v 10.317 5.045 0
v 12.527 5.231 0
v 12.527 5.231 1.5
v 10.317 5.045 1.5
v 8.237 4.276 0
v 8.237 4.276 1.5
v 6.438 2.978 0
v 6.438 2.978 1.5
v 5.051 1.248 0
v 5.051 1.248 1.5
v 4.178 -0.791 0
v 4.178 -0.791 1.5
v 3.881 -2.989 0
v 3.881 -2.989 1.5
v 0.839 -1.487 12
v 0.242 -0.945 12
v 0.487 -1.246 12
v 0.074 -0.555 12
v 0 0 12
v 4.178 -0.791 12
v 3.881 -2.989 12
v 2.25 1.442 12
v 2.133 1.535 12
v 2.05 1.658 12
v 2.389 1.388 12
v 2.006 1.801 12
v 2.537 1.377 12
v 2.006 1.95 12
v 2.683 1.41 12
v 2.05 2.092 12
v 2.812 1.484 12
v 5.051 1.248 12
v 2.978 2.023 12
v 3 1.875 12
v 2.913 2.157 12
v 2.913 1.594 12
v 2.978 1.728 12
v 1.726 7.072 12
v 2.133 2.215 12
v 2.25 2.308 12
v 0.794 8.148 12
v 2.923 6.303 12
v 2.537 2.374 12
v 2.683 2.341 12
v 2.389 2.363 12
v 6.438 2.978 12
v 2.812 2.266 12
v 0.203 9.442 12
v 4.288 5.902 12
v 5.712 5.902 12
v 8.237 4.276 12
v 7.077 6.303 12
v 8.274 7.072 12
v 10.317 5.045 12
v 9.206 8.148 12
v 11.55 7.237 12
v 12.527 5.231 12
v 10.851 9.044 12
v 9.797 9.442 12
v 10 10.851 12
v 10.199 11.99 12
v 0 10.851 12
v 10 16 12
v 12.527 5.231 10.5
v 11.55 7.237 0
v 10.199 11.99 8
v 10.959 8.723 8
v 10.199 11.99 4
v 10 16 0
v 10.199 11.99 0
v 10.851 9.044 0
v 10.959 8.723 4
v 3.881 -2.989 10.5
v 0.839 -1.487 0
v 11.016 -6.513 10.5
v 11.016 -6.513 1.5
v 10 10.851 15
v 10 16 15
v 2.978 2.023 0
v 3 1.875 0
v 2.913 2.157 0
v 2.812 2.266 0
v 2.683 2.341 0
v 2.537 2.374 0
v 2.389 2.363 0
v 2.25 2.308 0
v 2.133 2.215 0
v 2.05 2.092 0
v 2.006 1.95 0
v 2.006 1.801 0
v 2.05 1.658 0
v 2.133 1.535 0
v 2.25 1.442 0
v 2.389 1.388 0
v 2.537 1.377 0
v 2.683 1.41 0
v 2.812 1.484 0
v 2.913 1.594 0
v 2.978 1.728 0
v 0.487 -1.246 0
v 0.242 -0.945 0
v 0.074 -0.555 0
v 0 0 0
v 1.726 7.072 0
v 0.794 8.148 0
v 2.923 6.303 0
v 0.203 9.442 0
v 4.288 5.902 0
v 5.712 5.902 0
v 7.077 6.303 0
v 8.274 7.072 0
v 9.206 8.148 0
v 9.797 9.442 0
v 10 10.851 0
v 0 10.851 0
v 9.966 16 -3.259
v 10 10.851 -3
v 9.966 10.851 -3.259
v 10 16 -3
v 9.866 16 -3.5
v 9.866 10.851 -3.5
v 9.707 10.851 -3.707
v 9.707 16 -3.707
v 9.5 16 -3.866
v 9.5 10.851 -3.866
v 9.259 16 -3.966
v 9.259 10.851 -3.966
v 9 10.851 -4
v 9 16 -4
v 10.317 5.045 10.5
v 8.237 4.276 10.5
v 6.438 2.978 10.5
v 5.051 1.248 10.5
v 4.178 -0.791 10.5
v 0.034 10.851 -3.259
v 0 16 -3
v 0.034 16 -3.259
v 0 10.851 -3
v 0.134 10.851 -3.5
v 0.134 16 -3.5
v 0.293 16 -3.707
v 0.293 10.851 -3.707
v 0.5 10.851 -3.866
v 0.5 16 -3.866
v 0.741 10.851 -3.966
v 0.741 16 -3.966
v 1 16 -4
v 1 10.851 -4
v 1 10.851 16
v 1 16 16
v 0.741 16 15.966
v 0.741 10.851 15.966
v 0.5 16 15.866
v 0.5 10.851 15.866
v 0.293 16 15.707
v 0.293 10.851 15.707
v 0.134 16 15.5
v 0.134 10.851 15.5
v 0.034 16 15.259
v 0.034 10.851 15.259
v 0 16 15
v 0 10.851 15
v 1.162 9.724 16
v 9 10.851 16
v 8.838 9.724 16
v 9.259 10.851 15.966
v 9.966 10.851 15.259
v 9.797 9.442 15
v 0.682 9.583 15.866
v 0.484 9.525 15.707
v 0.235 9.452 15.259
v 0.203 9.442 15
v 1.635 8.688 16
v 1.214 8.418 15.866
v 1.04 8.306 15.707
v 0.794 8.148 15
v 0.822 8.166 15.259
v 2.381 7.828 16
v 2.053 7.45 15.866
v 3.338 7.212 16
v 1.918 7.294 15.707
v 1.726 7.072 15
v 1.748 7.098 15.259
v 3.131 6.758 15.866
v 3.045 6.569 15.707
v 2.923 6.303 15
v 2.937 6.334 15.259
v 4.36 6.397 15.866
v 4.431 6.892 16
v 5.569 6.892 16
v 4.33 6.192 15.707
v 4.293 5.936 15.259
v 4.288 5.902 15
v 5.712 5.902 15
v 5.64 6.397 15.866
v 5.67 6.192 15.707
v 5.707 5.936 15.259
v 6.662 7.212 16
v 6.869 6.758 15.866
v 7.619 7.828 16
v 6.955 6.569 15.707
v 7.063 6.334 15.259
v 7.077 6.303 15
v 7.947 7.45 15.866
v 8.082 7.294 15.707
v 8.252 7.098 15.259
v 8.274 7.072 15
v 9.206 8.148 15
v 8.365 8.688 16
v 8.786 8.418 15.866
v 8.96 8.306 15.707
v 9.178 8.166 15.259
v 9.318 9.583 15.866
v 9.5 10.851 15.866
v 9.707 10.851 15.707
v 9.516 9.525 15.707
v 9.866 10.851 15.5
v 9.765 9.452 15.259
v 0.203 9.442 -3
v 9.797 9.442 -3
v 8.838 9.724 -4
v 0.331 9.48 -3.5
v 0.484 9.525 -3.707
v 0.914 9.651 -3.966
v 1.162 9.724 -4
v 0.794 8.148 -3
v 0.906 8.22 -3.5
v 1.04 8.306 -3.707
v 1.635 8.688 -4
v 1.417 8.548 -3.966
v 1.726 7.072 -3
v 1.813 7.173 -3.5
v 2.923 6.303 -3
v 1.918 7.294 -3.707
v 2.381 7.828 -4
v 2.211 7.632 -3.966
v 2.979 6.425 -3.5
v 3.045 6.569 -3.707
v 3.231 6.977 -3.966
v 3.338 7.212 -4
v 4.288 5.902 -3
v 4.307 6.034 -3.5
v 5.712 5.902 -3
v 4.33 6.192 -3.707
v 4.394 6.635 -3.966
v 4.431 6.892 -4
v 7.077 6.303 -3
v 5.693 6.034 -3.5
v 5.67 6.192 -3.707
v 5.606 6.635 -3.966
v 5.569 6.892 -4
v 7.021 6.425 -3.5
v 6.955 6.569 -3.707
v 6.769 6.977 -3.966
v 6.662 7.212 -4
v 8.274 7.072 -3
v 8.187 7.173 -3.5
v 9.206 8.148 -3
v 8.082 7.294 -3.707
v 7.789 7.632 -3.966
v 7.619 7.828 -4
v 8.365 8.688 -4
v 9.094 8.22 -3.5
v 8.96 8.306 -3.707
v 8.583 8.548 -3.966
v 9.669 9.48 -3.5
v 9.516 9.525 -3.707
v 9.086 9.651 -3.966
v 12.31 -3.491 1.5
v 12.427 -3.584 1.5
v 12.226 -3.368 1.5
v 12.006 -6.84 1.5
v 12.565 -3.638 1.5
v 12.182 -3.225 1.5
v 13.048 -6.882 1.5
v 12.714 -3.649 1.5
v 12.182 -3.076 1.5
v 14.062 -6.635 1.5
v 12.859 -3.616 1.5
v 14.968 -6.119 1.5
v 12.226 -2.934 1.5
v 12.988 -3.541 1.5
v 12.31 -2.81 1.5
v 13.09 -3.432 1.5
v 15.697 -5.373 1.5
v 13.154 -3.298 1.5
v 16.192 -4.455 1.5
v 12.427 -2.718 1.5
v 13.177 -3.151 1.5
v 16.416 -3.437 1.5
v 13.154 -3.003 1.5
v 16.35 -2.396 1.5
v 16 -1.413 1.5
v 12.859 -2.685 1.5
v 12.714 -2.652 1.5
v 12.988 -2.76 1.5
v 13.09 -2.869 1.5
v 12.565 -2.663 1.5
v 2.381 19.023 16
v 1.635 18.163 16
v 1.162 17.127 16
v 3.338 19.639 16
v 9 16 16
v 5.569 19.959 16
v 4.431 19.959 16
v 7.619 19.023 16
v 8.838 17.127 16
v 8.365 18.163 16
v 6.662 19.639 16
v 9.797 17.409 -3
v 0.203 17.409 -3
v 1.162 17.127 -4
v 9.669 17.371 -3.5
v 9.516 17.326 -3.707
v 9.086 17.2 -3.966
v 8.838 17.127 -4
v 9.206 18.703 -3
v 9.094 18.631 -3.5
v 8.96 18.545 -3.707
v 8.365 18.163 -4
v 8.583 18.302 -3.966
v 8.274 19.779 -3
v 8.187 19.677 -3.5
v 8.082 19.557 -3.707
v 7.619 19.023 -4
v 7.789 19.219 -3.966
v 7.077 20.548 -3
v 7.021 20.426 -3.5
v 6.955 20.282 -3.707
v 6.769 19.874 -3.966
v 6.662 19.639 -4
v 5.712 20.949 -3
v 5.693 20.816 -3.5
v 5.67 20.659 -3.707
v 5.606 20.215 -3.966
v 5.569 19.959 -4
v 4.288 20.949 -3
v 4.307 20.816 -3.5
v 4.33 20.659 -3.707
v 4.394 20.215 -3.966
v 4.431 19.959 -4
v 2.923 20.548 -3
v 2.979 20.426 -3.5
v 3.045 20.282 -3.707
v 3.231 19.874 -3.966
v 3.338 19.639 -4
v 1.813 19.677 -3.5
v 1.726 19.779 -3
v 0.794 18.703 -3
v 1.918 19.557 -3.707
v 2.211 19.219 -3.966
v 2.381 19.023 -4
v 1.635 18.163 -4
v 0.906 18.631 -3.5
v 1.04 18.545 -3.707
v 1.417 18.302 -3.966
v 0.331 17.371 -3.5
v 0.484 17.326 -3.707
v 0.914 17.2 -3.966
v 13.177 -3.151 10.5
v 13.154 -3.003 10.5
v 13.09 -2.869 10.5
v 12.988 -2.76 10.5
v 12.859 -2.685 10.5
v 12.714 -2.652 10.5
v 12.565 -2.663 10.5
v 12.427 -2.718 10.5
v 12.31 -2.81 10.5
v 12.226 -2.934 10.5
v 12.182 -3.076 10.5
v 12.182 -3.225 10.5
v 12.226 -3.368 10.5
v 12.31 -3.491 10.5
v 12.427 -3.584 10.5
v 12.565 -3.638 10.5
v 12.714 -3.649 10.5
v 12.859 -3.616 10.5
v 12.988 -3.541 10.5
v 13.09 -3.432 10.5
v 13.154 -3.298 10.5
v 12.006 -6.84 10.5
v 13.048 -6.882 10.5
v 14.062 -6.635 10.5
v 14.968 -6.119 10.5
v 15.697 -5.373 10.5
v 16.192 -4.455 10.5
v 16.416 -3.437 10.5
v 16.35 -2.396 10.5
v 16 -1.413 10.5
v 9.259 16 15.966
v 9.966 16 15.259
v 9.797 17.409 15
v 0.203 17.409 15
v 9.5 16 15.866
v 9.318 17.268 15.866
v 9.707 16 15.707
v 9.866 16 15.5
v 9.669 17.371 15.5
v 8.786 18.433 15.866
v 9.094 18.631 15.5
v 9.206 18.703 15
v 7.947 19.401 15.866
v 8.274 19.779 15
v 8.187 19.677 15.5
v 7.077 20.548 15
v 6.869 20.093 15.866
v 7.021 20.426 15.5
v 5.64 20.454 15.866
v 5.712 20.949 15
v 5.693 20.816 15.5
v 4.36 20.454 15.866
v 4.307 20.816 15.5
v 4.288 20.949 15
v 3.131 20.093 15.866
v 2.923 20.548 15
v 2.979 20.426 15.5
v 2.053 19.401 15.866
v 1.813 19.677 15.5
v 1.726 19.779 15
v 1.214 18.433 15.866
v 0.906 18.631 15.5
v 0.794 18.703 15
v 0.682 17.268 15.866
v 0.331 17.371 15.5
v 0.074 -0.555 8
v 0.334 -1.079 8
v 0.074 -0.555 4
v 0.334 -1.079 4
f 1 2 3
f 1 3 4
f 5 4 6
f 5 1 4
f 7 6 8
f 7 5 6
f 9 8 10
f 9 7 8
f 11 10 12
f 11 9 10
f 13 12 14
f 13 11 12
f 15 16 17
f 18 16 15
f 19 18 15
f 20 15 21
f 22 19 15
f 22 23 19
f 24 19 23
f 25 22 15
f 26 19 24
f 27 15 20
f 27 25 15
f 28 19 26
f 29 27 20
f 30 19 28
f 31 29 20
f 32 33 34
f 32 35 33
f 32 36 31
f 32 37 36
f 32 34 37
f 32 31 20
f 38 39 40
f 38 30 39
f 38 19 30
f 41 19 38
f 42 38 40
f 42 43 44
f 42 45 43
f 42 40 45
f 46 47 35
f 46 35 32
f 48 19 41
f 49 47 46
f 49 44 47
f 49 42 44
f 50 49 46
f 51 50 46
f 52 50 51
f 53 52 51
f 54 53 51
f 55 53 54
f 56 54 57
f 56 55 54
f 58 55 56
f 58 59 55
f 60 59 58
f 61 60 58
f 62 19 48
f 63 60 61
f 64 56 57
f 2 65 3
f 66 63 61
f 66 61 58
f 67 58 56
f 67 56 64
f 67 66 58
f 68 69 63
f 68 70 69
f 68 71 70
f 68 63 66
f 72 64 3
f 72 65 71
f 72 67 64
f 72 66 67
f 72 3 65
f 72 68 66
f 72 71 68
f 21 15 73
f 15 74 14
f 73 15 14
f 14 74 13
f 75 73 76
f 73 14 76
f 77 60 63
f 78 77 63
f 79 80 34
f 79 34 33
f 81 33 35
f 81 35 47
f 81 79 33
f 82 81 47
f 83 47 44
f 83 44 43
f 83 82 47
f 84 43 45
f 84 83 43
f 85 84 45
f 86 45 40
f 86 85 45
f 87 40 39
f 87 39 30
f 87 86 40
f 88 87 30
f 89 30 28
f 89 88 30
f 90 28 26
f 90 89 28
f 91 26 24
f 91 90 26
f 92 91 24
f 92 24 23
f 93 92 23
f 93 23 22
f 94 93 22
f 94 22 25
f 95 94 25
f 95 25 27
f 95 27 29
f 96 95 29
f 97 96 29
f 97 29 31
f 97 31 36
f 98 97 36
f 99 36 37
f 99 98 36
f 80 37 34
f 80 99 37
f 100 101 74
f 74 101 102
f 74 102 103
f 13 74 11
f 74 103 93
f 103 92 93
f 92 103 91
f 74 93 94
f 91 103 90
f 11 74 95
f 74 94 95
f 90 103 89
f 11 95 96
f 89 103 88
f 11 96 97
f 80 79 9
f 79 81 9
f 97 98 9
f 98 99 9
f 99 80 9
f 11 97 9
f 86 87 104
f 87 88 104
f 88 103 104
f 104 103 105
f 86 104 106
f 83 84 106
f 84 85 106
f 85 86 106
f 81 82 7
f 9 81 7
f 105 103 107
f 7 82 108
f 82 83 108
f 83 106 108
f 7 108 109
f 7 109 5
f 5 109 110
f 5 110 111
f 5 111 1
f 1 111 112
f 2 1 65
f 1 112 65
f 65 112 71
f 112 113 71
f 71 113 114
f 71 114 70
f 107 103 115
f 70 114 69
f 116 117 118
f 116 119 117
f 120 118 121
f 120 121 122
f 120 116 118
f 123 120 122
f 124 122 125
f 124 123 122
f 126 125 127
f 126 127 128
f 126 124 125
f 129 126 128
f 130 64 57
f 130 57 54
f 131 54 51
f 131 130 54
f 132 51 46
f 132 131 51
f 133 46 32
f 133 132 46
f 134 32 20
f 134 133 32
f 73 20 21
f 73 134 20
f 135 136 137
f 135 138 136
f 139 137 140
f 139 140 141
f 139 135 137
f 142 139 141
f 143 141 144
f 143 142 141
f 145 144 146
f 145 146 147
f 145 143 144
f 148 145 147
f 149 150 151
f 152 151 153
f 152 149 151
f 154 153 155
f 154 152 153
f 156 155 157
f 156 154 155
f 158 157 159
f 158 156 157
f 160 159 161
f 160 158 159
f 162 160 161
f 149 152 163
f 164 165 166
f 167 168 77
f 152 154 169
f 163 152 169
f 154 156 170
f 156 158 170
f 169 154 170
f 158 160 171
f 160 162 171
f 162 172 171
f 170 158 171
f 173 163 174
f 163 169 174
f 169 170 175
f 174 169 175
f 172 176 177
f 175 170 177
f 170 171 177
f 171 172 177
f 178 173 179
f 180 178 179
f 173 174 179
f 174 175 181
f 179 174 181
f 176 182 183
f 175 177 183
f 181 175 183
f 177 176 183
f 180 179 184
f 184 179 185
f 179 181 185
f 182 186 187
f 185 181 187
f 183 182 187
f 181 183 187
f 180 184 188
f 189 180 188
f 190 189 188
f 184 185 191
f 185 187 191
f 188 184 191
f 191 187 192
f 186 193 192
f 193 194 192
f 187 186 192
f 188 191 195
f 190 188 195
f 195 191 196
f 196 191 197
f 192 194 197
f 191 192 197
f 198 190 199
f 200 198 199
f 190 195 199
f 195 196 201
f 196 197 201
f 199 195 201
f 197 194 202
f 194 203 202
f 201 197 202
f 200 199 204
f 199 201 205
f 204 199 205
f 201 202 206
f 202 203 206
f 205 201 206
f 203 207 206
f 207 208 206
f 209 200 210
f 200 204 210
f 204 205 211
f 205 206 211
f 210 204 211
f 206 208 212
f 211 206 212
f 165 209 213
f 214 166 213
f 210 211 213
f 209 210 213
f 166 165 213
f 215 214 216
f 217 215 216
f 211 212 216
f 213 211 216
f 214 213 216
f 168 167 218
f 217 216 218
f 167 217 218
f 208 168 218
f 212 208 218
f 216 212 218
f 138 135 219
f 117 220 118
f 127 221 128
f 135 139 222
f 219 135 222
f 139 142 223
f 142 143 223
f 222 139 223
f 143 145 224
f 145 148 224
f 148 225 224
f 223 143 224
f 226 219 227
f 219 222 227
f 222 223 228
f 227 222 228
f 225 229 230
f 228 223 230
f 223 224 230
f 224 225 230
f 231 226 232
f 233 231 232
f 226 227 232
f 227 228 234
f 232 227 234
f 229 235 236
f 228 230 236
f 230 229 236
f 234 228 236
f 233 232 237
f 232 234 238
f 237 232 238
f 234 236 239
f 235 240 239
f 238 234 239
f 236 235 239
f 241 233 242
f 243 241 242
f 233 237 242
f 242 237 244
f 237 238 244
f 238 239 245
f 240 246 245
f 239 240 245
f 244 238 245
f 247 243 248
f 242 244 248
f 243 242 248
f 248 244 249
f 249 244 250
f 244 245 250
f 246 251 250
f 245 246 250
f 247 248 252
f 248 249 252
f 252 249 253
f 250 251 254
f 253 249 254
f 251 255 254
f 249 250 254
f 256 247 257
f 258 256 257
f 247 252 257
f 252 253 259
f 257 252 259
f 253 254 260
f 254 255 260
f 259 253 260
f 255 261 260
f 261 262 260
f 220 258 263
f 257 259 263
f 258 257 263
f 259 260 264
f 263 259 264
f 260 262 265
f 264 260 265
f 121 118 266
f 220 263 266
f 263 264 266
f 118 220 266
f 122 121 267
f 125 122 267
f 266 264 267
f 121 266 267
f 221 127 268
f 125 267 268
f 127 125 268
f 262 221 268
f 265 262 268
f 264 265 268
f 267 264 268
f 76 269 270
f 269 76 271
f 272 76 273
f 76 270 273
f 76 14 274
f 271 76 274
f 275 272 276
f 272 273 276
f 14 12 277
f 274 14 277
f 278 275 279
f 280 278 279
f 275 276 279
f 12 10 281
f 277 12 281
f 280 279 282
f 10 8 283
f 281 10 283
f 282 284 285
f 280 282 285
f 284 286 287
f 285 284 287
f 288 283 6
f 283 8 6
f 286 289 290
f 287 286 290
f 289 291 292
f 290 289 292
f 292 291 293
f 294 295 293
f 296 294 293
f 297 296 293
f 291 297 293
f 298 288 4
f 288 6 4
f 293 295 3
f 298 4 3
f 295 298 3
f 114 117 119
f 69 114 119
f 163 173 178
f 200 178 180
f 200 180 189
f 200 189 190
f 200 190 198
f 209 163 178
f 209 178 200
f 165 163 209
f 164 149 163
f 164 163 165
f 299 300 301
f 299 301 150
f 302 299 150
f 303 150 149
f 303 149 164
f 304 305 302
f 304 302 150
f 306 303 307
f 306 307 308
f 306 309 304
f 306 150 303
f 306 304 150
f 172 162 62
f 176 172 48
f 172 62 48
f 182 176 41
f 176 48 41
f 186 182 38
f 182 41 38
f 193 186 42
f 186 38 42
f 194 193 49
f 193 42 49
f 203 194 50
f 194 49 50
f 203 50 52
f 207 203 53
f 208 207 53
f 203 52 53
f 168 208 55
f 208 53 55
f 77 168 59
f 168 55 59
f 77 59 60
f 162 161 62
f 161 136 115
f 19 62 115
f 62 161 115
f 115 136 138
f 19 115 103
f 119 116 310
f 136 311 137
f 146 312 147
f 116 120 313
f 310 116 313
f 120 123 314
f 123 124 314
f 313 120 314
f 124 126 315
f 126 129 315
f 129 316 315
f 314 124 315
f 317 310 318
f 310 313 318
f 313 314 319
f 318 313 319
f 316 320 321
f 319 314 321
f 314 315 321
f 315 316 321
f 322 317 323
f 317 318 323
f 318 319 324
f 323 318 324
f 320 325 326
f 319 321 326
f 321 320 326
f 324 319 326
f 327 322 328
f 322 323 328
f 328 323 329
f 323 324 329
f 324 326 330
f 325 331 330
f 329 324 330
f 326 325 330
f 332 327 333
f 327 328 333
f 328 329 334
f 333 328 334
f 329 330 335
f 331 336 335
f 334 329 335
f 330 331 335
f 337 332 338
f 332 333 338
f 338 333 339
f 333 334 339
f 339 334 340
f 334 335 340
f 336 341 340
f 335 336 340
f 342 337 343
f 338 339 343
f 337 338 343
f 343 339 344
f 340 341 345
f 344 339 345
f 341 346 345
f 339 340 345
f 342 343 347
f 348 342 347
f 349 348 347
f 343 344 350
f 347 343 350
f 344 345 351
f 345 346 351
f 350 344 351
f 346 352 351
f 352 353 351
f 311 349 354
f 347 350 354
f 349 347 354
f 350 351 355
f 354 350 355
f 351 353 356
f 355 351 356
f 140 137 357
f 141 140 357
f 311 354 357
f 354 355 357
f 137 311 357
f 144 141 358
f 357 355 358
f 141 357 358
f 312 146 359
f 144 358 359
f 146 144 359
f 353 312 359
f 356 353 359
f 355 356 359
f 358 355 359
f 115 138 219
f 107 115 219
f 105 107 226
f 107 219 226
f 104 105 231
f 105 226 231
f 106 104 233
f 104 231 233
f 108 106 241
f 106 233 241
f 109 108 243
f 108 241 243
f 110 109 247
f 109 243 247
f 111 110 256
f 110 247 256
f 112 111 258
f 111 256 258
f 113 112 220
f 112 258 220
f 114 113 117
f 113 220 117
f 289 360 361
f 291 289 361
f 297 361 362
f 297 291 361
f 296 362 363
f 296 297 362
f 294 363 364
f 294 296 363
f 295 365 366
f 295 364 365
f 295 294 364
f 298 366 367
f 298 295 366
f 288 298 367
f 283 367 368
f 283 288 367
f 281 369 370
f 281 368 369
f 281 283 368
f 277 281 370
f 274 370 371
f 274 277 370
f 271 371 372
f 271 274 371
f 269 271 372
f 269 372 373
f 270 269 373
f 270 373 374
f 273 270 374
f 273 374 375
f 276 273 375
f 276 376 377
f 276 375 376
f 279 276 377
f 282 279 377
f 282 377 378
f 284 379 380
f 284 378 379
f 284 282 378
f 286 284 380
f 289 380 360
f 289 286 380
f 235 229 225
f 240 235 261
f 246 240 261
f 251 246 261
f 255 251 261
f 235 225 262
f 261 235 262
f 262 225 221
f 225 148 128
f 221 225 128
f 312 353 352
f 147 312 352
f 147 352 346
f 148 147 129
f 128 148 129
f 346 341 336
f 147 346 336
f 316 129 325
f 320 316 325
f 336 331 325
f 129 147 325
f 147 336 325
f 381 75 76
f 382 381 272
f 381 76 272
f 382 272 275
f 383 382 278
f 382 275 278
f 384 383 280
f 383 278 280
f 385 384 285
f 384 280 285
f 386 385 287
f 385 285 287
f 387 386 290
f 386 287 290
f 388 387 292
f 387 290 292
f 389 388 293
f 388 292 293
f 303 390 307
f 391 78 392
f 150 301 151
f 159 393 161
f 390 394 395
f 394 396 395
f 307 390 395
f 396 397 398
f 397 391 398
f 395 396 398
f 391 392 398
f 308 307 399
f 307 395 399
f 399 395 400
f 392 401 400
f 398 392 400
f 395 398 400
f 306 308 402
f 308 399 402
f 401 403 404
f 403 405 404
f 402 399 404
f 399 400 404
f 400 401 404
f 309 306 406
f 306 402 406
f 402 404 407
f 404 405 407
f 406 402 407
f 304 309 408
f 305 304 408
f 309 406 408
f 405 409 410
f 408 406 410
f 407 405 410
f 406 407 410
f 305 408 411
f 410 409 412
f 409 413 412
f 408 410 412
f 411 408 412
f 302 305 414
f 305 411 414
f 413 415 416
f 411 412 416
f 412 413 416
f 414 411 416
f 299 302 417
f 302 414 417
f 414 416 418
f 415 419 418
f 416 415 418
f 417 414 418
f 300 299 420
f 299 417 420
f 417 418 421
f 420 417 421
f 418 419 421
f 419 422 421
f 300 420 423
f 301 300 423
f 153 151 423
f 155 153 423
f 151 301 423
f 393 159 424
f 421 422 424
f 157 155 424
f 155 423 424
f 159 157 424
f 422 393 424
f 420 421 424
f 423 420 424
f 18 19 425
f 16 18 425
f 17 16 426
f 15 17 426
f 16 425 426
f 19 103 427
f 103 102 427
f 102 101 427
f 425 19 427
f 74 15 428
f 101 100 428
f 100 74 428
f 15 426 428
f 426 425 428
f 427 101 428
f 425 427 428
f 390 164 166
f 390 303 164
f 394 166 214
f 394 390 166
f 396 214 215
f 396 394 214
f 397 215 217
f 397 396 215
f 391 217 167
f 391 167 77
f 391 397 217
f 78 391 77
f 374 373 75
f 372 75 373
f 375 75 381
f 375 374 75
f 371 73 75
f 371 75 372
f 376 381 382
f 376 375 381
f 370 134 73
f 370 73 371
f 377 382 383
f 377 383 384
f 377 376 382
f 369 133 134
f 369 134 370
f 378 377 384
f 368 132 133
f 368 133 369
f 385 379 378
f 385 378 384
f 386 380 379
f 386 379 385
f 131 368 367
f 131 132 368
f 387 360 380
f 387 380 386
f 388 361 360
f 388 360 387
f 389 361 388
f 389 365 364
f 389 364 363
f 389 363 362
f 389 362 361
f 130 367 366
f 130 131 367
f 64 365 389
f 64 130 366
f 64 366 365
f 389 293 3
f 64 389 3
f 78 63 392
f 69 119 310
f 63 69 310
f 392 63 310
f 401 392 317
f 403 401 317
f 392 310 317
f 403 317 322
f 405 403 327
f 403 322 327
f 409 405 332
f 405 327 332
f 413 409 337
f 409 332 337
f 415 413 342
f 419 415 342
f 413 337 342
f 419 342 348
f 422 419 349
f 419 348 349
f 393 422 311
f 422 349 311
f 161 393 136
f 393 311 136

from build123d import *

# Parameters (mm, degrees)
SKETCHDISTALINTERNAL_R          = 0.5
BOSSEXTRUDEDISTALINTERNAL_DEPTH = 12
CUTEXTRUDEDISTALBARL_START      = -1.5
CUTEXTRUDEDISTALBARL_DEPTH      = 1.5
CUTEXTRUDEDISTALBARR_DEPTH      = 1.5
BOSSEXTRUDEEXTERNAL_START       = -16
BOSSEXTRUDEEXTERNAL_DEPTH       = 20
FILLETDISTALEXTERNAL_R          = 1


with BuildPart() as part:
    # SketchDistalInternal → BossExtrudeDistalInternal (new body)
    with BuildSketch(Plane.XY):
        with BuildLine():
            Line((0.839496756, -1.48710509), (11.016133562, -6.51289491))
            ThreePointArc((11.016133562, -6.51289491), (15.358517882, -5.771641109), (16, -1.4134007))
            Line((16, -1.4134007), (12.527091293, 5.230590272))
            add(Edge.make_bspline(
                [(10, 16), (10, 11.295651098), (10.473683301, 9.158946966), (12.527091293, 5.230590272)],
                knots=[0, 0, 0, 0, 1, 1, 1, 1], degree=3))
            ThreePointArc((10, 16), (5, 21), (0, 16))
            Line((0, 16), (0, 0))
            add(Edge.make_bspline(
                [(0, 0), (0, -0.54020277), (0.191605084, -1.167140113), (0.839496756, -1.48710509)],
                knots=[0, 0, 0, 0, 1, 1, 1, 1], degree=3))
        make_face()
        with Locations((2.5, 1.875219846)):
            Circle(SKETCHDISTALINTERNAL_R, mode=Mode.SUBTRACT)
        with Locations((12.676636807, -3.150569974)):
            Circle(SKETCHDISTALINTERNAL_R, mode=Mode.SUBTRACT)
    extrude(amount=BOSSEXTRUDEDISTALINTERNAL_DEPTH)

    # SketchCutBarL → CutExtrudeDistalBarL (cut)
    with BuildSketch(Plane.XY.offset(12).offset(CUTEXTRUDEDISTALBARL_START)):
        with BuildLine():
            Line((3.880618629, -2.98898038), (11.016133562, -6.51289491))
            ThreePointArc((11.016133562, -6.51289491), (15.358517882, -5.771641109), (16, -1.4134007))
            Line((16, -1.4134007), (12.527091293, 5.230590272))
            ThreePointArc((12.527091293, 5.230590272), (6.43792312, 2.978454456), (3.880618629, -2.98898038))
        make_face()
    extrude(amount=CUTEXTRUDEDISTALBARL_DEPTH, mode=Mode.SUBTRACT)

    # SketchCutBarR → CutExtrudeDistalBarR (cut)
    with BuildSketch(Plane.XY):
        with BuildLine():
            Line((3.880618629, -2.98898038), (11.016133562, -6.51289491))
            ThreePointArc((11.016133562, -6.51289491), (15.358517882, -5.771641109), (16, -1.4134007))
            Line((16, -1.4134007), (12.527091293, 5.230590272))
            ThreePointArc((12.527091293, 5.230590272), (6.43792312, 2.978454456), (3.880618629, -2.98898038))
        make_face()
    extrude(amount=CUTEXTRUDEDISTALBARR_DEPTH, mode=Mode.SUBTRACT)

    # SketchDistalExternal → BossExtrudeExternal (add)
    with BuildSketch(Plane.XY.offset(12).offset(BOSSEXTRUDEEXTERNAL_START)):
        with BuildLine():
            Line((0, 16), (0, 10.850906929))
            ThreePointArc((0, 10.850906929), (5, 5.850906929), (10, 10.850906929))
            Line((10, 10.850906929), (10, 16))
            ThreePointArc((10, 16), (5, 21), (0, 16))
        make_face()
    extrude(amount=BOSSEXTRUDEEXTERNAL_DEPTH)

    # FilletDistalExternal
    filletdistalexternal_edges = [part.edges().sort_by_distance(p)[0] for p in [
        (5, 21, -4),
        (10, 13.425453465, -4),
        (5, 5.850906929, -4),
        (0, 13.425453465, -4),
        (5, 21, 16),
        (0, 13.425453465, 16),
        (5, 5.850906929, 16),
        (10, 13.425453465, 16),
    ]]
    fillet(filletdistalexternal_edges, radius=FILLETDISTALEXTERNAL_R)


solid = part.part
